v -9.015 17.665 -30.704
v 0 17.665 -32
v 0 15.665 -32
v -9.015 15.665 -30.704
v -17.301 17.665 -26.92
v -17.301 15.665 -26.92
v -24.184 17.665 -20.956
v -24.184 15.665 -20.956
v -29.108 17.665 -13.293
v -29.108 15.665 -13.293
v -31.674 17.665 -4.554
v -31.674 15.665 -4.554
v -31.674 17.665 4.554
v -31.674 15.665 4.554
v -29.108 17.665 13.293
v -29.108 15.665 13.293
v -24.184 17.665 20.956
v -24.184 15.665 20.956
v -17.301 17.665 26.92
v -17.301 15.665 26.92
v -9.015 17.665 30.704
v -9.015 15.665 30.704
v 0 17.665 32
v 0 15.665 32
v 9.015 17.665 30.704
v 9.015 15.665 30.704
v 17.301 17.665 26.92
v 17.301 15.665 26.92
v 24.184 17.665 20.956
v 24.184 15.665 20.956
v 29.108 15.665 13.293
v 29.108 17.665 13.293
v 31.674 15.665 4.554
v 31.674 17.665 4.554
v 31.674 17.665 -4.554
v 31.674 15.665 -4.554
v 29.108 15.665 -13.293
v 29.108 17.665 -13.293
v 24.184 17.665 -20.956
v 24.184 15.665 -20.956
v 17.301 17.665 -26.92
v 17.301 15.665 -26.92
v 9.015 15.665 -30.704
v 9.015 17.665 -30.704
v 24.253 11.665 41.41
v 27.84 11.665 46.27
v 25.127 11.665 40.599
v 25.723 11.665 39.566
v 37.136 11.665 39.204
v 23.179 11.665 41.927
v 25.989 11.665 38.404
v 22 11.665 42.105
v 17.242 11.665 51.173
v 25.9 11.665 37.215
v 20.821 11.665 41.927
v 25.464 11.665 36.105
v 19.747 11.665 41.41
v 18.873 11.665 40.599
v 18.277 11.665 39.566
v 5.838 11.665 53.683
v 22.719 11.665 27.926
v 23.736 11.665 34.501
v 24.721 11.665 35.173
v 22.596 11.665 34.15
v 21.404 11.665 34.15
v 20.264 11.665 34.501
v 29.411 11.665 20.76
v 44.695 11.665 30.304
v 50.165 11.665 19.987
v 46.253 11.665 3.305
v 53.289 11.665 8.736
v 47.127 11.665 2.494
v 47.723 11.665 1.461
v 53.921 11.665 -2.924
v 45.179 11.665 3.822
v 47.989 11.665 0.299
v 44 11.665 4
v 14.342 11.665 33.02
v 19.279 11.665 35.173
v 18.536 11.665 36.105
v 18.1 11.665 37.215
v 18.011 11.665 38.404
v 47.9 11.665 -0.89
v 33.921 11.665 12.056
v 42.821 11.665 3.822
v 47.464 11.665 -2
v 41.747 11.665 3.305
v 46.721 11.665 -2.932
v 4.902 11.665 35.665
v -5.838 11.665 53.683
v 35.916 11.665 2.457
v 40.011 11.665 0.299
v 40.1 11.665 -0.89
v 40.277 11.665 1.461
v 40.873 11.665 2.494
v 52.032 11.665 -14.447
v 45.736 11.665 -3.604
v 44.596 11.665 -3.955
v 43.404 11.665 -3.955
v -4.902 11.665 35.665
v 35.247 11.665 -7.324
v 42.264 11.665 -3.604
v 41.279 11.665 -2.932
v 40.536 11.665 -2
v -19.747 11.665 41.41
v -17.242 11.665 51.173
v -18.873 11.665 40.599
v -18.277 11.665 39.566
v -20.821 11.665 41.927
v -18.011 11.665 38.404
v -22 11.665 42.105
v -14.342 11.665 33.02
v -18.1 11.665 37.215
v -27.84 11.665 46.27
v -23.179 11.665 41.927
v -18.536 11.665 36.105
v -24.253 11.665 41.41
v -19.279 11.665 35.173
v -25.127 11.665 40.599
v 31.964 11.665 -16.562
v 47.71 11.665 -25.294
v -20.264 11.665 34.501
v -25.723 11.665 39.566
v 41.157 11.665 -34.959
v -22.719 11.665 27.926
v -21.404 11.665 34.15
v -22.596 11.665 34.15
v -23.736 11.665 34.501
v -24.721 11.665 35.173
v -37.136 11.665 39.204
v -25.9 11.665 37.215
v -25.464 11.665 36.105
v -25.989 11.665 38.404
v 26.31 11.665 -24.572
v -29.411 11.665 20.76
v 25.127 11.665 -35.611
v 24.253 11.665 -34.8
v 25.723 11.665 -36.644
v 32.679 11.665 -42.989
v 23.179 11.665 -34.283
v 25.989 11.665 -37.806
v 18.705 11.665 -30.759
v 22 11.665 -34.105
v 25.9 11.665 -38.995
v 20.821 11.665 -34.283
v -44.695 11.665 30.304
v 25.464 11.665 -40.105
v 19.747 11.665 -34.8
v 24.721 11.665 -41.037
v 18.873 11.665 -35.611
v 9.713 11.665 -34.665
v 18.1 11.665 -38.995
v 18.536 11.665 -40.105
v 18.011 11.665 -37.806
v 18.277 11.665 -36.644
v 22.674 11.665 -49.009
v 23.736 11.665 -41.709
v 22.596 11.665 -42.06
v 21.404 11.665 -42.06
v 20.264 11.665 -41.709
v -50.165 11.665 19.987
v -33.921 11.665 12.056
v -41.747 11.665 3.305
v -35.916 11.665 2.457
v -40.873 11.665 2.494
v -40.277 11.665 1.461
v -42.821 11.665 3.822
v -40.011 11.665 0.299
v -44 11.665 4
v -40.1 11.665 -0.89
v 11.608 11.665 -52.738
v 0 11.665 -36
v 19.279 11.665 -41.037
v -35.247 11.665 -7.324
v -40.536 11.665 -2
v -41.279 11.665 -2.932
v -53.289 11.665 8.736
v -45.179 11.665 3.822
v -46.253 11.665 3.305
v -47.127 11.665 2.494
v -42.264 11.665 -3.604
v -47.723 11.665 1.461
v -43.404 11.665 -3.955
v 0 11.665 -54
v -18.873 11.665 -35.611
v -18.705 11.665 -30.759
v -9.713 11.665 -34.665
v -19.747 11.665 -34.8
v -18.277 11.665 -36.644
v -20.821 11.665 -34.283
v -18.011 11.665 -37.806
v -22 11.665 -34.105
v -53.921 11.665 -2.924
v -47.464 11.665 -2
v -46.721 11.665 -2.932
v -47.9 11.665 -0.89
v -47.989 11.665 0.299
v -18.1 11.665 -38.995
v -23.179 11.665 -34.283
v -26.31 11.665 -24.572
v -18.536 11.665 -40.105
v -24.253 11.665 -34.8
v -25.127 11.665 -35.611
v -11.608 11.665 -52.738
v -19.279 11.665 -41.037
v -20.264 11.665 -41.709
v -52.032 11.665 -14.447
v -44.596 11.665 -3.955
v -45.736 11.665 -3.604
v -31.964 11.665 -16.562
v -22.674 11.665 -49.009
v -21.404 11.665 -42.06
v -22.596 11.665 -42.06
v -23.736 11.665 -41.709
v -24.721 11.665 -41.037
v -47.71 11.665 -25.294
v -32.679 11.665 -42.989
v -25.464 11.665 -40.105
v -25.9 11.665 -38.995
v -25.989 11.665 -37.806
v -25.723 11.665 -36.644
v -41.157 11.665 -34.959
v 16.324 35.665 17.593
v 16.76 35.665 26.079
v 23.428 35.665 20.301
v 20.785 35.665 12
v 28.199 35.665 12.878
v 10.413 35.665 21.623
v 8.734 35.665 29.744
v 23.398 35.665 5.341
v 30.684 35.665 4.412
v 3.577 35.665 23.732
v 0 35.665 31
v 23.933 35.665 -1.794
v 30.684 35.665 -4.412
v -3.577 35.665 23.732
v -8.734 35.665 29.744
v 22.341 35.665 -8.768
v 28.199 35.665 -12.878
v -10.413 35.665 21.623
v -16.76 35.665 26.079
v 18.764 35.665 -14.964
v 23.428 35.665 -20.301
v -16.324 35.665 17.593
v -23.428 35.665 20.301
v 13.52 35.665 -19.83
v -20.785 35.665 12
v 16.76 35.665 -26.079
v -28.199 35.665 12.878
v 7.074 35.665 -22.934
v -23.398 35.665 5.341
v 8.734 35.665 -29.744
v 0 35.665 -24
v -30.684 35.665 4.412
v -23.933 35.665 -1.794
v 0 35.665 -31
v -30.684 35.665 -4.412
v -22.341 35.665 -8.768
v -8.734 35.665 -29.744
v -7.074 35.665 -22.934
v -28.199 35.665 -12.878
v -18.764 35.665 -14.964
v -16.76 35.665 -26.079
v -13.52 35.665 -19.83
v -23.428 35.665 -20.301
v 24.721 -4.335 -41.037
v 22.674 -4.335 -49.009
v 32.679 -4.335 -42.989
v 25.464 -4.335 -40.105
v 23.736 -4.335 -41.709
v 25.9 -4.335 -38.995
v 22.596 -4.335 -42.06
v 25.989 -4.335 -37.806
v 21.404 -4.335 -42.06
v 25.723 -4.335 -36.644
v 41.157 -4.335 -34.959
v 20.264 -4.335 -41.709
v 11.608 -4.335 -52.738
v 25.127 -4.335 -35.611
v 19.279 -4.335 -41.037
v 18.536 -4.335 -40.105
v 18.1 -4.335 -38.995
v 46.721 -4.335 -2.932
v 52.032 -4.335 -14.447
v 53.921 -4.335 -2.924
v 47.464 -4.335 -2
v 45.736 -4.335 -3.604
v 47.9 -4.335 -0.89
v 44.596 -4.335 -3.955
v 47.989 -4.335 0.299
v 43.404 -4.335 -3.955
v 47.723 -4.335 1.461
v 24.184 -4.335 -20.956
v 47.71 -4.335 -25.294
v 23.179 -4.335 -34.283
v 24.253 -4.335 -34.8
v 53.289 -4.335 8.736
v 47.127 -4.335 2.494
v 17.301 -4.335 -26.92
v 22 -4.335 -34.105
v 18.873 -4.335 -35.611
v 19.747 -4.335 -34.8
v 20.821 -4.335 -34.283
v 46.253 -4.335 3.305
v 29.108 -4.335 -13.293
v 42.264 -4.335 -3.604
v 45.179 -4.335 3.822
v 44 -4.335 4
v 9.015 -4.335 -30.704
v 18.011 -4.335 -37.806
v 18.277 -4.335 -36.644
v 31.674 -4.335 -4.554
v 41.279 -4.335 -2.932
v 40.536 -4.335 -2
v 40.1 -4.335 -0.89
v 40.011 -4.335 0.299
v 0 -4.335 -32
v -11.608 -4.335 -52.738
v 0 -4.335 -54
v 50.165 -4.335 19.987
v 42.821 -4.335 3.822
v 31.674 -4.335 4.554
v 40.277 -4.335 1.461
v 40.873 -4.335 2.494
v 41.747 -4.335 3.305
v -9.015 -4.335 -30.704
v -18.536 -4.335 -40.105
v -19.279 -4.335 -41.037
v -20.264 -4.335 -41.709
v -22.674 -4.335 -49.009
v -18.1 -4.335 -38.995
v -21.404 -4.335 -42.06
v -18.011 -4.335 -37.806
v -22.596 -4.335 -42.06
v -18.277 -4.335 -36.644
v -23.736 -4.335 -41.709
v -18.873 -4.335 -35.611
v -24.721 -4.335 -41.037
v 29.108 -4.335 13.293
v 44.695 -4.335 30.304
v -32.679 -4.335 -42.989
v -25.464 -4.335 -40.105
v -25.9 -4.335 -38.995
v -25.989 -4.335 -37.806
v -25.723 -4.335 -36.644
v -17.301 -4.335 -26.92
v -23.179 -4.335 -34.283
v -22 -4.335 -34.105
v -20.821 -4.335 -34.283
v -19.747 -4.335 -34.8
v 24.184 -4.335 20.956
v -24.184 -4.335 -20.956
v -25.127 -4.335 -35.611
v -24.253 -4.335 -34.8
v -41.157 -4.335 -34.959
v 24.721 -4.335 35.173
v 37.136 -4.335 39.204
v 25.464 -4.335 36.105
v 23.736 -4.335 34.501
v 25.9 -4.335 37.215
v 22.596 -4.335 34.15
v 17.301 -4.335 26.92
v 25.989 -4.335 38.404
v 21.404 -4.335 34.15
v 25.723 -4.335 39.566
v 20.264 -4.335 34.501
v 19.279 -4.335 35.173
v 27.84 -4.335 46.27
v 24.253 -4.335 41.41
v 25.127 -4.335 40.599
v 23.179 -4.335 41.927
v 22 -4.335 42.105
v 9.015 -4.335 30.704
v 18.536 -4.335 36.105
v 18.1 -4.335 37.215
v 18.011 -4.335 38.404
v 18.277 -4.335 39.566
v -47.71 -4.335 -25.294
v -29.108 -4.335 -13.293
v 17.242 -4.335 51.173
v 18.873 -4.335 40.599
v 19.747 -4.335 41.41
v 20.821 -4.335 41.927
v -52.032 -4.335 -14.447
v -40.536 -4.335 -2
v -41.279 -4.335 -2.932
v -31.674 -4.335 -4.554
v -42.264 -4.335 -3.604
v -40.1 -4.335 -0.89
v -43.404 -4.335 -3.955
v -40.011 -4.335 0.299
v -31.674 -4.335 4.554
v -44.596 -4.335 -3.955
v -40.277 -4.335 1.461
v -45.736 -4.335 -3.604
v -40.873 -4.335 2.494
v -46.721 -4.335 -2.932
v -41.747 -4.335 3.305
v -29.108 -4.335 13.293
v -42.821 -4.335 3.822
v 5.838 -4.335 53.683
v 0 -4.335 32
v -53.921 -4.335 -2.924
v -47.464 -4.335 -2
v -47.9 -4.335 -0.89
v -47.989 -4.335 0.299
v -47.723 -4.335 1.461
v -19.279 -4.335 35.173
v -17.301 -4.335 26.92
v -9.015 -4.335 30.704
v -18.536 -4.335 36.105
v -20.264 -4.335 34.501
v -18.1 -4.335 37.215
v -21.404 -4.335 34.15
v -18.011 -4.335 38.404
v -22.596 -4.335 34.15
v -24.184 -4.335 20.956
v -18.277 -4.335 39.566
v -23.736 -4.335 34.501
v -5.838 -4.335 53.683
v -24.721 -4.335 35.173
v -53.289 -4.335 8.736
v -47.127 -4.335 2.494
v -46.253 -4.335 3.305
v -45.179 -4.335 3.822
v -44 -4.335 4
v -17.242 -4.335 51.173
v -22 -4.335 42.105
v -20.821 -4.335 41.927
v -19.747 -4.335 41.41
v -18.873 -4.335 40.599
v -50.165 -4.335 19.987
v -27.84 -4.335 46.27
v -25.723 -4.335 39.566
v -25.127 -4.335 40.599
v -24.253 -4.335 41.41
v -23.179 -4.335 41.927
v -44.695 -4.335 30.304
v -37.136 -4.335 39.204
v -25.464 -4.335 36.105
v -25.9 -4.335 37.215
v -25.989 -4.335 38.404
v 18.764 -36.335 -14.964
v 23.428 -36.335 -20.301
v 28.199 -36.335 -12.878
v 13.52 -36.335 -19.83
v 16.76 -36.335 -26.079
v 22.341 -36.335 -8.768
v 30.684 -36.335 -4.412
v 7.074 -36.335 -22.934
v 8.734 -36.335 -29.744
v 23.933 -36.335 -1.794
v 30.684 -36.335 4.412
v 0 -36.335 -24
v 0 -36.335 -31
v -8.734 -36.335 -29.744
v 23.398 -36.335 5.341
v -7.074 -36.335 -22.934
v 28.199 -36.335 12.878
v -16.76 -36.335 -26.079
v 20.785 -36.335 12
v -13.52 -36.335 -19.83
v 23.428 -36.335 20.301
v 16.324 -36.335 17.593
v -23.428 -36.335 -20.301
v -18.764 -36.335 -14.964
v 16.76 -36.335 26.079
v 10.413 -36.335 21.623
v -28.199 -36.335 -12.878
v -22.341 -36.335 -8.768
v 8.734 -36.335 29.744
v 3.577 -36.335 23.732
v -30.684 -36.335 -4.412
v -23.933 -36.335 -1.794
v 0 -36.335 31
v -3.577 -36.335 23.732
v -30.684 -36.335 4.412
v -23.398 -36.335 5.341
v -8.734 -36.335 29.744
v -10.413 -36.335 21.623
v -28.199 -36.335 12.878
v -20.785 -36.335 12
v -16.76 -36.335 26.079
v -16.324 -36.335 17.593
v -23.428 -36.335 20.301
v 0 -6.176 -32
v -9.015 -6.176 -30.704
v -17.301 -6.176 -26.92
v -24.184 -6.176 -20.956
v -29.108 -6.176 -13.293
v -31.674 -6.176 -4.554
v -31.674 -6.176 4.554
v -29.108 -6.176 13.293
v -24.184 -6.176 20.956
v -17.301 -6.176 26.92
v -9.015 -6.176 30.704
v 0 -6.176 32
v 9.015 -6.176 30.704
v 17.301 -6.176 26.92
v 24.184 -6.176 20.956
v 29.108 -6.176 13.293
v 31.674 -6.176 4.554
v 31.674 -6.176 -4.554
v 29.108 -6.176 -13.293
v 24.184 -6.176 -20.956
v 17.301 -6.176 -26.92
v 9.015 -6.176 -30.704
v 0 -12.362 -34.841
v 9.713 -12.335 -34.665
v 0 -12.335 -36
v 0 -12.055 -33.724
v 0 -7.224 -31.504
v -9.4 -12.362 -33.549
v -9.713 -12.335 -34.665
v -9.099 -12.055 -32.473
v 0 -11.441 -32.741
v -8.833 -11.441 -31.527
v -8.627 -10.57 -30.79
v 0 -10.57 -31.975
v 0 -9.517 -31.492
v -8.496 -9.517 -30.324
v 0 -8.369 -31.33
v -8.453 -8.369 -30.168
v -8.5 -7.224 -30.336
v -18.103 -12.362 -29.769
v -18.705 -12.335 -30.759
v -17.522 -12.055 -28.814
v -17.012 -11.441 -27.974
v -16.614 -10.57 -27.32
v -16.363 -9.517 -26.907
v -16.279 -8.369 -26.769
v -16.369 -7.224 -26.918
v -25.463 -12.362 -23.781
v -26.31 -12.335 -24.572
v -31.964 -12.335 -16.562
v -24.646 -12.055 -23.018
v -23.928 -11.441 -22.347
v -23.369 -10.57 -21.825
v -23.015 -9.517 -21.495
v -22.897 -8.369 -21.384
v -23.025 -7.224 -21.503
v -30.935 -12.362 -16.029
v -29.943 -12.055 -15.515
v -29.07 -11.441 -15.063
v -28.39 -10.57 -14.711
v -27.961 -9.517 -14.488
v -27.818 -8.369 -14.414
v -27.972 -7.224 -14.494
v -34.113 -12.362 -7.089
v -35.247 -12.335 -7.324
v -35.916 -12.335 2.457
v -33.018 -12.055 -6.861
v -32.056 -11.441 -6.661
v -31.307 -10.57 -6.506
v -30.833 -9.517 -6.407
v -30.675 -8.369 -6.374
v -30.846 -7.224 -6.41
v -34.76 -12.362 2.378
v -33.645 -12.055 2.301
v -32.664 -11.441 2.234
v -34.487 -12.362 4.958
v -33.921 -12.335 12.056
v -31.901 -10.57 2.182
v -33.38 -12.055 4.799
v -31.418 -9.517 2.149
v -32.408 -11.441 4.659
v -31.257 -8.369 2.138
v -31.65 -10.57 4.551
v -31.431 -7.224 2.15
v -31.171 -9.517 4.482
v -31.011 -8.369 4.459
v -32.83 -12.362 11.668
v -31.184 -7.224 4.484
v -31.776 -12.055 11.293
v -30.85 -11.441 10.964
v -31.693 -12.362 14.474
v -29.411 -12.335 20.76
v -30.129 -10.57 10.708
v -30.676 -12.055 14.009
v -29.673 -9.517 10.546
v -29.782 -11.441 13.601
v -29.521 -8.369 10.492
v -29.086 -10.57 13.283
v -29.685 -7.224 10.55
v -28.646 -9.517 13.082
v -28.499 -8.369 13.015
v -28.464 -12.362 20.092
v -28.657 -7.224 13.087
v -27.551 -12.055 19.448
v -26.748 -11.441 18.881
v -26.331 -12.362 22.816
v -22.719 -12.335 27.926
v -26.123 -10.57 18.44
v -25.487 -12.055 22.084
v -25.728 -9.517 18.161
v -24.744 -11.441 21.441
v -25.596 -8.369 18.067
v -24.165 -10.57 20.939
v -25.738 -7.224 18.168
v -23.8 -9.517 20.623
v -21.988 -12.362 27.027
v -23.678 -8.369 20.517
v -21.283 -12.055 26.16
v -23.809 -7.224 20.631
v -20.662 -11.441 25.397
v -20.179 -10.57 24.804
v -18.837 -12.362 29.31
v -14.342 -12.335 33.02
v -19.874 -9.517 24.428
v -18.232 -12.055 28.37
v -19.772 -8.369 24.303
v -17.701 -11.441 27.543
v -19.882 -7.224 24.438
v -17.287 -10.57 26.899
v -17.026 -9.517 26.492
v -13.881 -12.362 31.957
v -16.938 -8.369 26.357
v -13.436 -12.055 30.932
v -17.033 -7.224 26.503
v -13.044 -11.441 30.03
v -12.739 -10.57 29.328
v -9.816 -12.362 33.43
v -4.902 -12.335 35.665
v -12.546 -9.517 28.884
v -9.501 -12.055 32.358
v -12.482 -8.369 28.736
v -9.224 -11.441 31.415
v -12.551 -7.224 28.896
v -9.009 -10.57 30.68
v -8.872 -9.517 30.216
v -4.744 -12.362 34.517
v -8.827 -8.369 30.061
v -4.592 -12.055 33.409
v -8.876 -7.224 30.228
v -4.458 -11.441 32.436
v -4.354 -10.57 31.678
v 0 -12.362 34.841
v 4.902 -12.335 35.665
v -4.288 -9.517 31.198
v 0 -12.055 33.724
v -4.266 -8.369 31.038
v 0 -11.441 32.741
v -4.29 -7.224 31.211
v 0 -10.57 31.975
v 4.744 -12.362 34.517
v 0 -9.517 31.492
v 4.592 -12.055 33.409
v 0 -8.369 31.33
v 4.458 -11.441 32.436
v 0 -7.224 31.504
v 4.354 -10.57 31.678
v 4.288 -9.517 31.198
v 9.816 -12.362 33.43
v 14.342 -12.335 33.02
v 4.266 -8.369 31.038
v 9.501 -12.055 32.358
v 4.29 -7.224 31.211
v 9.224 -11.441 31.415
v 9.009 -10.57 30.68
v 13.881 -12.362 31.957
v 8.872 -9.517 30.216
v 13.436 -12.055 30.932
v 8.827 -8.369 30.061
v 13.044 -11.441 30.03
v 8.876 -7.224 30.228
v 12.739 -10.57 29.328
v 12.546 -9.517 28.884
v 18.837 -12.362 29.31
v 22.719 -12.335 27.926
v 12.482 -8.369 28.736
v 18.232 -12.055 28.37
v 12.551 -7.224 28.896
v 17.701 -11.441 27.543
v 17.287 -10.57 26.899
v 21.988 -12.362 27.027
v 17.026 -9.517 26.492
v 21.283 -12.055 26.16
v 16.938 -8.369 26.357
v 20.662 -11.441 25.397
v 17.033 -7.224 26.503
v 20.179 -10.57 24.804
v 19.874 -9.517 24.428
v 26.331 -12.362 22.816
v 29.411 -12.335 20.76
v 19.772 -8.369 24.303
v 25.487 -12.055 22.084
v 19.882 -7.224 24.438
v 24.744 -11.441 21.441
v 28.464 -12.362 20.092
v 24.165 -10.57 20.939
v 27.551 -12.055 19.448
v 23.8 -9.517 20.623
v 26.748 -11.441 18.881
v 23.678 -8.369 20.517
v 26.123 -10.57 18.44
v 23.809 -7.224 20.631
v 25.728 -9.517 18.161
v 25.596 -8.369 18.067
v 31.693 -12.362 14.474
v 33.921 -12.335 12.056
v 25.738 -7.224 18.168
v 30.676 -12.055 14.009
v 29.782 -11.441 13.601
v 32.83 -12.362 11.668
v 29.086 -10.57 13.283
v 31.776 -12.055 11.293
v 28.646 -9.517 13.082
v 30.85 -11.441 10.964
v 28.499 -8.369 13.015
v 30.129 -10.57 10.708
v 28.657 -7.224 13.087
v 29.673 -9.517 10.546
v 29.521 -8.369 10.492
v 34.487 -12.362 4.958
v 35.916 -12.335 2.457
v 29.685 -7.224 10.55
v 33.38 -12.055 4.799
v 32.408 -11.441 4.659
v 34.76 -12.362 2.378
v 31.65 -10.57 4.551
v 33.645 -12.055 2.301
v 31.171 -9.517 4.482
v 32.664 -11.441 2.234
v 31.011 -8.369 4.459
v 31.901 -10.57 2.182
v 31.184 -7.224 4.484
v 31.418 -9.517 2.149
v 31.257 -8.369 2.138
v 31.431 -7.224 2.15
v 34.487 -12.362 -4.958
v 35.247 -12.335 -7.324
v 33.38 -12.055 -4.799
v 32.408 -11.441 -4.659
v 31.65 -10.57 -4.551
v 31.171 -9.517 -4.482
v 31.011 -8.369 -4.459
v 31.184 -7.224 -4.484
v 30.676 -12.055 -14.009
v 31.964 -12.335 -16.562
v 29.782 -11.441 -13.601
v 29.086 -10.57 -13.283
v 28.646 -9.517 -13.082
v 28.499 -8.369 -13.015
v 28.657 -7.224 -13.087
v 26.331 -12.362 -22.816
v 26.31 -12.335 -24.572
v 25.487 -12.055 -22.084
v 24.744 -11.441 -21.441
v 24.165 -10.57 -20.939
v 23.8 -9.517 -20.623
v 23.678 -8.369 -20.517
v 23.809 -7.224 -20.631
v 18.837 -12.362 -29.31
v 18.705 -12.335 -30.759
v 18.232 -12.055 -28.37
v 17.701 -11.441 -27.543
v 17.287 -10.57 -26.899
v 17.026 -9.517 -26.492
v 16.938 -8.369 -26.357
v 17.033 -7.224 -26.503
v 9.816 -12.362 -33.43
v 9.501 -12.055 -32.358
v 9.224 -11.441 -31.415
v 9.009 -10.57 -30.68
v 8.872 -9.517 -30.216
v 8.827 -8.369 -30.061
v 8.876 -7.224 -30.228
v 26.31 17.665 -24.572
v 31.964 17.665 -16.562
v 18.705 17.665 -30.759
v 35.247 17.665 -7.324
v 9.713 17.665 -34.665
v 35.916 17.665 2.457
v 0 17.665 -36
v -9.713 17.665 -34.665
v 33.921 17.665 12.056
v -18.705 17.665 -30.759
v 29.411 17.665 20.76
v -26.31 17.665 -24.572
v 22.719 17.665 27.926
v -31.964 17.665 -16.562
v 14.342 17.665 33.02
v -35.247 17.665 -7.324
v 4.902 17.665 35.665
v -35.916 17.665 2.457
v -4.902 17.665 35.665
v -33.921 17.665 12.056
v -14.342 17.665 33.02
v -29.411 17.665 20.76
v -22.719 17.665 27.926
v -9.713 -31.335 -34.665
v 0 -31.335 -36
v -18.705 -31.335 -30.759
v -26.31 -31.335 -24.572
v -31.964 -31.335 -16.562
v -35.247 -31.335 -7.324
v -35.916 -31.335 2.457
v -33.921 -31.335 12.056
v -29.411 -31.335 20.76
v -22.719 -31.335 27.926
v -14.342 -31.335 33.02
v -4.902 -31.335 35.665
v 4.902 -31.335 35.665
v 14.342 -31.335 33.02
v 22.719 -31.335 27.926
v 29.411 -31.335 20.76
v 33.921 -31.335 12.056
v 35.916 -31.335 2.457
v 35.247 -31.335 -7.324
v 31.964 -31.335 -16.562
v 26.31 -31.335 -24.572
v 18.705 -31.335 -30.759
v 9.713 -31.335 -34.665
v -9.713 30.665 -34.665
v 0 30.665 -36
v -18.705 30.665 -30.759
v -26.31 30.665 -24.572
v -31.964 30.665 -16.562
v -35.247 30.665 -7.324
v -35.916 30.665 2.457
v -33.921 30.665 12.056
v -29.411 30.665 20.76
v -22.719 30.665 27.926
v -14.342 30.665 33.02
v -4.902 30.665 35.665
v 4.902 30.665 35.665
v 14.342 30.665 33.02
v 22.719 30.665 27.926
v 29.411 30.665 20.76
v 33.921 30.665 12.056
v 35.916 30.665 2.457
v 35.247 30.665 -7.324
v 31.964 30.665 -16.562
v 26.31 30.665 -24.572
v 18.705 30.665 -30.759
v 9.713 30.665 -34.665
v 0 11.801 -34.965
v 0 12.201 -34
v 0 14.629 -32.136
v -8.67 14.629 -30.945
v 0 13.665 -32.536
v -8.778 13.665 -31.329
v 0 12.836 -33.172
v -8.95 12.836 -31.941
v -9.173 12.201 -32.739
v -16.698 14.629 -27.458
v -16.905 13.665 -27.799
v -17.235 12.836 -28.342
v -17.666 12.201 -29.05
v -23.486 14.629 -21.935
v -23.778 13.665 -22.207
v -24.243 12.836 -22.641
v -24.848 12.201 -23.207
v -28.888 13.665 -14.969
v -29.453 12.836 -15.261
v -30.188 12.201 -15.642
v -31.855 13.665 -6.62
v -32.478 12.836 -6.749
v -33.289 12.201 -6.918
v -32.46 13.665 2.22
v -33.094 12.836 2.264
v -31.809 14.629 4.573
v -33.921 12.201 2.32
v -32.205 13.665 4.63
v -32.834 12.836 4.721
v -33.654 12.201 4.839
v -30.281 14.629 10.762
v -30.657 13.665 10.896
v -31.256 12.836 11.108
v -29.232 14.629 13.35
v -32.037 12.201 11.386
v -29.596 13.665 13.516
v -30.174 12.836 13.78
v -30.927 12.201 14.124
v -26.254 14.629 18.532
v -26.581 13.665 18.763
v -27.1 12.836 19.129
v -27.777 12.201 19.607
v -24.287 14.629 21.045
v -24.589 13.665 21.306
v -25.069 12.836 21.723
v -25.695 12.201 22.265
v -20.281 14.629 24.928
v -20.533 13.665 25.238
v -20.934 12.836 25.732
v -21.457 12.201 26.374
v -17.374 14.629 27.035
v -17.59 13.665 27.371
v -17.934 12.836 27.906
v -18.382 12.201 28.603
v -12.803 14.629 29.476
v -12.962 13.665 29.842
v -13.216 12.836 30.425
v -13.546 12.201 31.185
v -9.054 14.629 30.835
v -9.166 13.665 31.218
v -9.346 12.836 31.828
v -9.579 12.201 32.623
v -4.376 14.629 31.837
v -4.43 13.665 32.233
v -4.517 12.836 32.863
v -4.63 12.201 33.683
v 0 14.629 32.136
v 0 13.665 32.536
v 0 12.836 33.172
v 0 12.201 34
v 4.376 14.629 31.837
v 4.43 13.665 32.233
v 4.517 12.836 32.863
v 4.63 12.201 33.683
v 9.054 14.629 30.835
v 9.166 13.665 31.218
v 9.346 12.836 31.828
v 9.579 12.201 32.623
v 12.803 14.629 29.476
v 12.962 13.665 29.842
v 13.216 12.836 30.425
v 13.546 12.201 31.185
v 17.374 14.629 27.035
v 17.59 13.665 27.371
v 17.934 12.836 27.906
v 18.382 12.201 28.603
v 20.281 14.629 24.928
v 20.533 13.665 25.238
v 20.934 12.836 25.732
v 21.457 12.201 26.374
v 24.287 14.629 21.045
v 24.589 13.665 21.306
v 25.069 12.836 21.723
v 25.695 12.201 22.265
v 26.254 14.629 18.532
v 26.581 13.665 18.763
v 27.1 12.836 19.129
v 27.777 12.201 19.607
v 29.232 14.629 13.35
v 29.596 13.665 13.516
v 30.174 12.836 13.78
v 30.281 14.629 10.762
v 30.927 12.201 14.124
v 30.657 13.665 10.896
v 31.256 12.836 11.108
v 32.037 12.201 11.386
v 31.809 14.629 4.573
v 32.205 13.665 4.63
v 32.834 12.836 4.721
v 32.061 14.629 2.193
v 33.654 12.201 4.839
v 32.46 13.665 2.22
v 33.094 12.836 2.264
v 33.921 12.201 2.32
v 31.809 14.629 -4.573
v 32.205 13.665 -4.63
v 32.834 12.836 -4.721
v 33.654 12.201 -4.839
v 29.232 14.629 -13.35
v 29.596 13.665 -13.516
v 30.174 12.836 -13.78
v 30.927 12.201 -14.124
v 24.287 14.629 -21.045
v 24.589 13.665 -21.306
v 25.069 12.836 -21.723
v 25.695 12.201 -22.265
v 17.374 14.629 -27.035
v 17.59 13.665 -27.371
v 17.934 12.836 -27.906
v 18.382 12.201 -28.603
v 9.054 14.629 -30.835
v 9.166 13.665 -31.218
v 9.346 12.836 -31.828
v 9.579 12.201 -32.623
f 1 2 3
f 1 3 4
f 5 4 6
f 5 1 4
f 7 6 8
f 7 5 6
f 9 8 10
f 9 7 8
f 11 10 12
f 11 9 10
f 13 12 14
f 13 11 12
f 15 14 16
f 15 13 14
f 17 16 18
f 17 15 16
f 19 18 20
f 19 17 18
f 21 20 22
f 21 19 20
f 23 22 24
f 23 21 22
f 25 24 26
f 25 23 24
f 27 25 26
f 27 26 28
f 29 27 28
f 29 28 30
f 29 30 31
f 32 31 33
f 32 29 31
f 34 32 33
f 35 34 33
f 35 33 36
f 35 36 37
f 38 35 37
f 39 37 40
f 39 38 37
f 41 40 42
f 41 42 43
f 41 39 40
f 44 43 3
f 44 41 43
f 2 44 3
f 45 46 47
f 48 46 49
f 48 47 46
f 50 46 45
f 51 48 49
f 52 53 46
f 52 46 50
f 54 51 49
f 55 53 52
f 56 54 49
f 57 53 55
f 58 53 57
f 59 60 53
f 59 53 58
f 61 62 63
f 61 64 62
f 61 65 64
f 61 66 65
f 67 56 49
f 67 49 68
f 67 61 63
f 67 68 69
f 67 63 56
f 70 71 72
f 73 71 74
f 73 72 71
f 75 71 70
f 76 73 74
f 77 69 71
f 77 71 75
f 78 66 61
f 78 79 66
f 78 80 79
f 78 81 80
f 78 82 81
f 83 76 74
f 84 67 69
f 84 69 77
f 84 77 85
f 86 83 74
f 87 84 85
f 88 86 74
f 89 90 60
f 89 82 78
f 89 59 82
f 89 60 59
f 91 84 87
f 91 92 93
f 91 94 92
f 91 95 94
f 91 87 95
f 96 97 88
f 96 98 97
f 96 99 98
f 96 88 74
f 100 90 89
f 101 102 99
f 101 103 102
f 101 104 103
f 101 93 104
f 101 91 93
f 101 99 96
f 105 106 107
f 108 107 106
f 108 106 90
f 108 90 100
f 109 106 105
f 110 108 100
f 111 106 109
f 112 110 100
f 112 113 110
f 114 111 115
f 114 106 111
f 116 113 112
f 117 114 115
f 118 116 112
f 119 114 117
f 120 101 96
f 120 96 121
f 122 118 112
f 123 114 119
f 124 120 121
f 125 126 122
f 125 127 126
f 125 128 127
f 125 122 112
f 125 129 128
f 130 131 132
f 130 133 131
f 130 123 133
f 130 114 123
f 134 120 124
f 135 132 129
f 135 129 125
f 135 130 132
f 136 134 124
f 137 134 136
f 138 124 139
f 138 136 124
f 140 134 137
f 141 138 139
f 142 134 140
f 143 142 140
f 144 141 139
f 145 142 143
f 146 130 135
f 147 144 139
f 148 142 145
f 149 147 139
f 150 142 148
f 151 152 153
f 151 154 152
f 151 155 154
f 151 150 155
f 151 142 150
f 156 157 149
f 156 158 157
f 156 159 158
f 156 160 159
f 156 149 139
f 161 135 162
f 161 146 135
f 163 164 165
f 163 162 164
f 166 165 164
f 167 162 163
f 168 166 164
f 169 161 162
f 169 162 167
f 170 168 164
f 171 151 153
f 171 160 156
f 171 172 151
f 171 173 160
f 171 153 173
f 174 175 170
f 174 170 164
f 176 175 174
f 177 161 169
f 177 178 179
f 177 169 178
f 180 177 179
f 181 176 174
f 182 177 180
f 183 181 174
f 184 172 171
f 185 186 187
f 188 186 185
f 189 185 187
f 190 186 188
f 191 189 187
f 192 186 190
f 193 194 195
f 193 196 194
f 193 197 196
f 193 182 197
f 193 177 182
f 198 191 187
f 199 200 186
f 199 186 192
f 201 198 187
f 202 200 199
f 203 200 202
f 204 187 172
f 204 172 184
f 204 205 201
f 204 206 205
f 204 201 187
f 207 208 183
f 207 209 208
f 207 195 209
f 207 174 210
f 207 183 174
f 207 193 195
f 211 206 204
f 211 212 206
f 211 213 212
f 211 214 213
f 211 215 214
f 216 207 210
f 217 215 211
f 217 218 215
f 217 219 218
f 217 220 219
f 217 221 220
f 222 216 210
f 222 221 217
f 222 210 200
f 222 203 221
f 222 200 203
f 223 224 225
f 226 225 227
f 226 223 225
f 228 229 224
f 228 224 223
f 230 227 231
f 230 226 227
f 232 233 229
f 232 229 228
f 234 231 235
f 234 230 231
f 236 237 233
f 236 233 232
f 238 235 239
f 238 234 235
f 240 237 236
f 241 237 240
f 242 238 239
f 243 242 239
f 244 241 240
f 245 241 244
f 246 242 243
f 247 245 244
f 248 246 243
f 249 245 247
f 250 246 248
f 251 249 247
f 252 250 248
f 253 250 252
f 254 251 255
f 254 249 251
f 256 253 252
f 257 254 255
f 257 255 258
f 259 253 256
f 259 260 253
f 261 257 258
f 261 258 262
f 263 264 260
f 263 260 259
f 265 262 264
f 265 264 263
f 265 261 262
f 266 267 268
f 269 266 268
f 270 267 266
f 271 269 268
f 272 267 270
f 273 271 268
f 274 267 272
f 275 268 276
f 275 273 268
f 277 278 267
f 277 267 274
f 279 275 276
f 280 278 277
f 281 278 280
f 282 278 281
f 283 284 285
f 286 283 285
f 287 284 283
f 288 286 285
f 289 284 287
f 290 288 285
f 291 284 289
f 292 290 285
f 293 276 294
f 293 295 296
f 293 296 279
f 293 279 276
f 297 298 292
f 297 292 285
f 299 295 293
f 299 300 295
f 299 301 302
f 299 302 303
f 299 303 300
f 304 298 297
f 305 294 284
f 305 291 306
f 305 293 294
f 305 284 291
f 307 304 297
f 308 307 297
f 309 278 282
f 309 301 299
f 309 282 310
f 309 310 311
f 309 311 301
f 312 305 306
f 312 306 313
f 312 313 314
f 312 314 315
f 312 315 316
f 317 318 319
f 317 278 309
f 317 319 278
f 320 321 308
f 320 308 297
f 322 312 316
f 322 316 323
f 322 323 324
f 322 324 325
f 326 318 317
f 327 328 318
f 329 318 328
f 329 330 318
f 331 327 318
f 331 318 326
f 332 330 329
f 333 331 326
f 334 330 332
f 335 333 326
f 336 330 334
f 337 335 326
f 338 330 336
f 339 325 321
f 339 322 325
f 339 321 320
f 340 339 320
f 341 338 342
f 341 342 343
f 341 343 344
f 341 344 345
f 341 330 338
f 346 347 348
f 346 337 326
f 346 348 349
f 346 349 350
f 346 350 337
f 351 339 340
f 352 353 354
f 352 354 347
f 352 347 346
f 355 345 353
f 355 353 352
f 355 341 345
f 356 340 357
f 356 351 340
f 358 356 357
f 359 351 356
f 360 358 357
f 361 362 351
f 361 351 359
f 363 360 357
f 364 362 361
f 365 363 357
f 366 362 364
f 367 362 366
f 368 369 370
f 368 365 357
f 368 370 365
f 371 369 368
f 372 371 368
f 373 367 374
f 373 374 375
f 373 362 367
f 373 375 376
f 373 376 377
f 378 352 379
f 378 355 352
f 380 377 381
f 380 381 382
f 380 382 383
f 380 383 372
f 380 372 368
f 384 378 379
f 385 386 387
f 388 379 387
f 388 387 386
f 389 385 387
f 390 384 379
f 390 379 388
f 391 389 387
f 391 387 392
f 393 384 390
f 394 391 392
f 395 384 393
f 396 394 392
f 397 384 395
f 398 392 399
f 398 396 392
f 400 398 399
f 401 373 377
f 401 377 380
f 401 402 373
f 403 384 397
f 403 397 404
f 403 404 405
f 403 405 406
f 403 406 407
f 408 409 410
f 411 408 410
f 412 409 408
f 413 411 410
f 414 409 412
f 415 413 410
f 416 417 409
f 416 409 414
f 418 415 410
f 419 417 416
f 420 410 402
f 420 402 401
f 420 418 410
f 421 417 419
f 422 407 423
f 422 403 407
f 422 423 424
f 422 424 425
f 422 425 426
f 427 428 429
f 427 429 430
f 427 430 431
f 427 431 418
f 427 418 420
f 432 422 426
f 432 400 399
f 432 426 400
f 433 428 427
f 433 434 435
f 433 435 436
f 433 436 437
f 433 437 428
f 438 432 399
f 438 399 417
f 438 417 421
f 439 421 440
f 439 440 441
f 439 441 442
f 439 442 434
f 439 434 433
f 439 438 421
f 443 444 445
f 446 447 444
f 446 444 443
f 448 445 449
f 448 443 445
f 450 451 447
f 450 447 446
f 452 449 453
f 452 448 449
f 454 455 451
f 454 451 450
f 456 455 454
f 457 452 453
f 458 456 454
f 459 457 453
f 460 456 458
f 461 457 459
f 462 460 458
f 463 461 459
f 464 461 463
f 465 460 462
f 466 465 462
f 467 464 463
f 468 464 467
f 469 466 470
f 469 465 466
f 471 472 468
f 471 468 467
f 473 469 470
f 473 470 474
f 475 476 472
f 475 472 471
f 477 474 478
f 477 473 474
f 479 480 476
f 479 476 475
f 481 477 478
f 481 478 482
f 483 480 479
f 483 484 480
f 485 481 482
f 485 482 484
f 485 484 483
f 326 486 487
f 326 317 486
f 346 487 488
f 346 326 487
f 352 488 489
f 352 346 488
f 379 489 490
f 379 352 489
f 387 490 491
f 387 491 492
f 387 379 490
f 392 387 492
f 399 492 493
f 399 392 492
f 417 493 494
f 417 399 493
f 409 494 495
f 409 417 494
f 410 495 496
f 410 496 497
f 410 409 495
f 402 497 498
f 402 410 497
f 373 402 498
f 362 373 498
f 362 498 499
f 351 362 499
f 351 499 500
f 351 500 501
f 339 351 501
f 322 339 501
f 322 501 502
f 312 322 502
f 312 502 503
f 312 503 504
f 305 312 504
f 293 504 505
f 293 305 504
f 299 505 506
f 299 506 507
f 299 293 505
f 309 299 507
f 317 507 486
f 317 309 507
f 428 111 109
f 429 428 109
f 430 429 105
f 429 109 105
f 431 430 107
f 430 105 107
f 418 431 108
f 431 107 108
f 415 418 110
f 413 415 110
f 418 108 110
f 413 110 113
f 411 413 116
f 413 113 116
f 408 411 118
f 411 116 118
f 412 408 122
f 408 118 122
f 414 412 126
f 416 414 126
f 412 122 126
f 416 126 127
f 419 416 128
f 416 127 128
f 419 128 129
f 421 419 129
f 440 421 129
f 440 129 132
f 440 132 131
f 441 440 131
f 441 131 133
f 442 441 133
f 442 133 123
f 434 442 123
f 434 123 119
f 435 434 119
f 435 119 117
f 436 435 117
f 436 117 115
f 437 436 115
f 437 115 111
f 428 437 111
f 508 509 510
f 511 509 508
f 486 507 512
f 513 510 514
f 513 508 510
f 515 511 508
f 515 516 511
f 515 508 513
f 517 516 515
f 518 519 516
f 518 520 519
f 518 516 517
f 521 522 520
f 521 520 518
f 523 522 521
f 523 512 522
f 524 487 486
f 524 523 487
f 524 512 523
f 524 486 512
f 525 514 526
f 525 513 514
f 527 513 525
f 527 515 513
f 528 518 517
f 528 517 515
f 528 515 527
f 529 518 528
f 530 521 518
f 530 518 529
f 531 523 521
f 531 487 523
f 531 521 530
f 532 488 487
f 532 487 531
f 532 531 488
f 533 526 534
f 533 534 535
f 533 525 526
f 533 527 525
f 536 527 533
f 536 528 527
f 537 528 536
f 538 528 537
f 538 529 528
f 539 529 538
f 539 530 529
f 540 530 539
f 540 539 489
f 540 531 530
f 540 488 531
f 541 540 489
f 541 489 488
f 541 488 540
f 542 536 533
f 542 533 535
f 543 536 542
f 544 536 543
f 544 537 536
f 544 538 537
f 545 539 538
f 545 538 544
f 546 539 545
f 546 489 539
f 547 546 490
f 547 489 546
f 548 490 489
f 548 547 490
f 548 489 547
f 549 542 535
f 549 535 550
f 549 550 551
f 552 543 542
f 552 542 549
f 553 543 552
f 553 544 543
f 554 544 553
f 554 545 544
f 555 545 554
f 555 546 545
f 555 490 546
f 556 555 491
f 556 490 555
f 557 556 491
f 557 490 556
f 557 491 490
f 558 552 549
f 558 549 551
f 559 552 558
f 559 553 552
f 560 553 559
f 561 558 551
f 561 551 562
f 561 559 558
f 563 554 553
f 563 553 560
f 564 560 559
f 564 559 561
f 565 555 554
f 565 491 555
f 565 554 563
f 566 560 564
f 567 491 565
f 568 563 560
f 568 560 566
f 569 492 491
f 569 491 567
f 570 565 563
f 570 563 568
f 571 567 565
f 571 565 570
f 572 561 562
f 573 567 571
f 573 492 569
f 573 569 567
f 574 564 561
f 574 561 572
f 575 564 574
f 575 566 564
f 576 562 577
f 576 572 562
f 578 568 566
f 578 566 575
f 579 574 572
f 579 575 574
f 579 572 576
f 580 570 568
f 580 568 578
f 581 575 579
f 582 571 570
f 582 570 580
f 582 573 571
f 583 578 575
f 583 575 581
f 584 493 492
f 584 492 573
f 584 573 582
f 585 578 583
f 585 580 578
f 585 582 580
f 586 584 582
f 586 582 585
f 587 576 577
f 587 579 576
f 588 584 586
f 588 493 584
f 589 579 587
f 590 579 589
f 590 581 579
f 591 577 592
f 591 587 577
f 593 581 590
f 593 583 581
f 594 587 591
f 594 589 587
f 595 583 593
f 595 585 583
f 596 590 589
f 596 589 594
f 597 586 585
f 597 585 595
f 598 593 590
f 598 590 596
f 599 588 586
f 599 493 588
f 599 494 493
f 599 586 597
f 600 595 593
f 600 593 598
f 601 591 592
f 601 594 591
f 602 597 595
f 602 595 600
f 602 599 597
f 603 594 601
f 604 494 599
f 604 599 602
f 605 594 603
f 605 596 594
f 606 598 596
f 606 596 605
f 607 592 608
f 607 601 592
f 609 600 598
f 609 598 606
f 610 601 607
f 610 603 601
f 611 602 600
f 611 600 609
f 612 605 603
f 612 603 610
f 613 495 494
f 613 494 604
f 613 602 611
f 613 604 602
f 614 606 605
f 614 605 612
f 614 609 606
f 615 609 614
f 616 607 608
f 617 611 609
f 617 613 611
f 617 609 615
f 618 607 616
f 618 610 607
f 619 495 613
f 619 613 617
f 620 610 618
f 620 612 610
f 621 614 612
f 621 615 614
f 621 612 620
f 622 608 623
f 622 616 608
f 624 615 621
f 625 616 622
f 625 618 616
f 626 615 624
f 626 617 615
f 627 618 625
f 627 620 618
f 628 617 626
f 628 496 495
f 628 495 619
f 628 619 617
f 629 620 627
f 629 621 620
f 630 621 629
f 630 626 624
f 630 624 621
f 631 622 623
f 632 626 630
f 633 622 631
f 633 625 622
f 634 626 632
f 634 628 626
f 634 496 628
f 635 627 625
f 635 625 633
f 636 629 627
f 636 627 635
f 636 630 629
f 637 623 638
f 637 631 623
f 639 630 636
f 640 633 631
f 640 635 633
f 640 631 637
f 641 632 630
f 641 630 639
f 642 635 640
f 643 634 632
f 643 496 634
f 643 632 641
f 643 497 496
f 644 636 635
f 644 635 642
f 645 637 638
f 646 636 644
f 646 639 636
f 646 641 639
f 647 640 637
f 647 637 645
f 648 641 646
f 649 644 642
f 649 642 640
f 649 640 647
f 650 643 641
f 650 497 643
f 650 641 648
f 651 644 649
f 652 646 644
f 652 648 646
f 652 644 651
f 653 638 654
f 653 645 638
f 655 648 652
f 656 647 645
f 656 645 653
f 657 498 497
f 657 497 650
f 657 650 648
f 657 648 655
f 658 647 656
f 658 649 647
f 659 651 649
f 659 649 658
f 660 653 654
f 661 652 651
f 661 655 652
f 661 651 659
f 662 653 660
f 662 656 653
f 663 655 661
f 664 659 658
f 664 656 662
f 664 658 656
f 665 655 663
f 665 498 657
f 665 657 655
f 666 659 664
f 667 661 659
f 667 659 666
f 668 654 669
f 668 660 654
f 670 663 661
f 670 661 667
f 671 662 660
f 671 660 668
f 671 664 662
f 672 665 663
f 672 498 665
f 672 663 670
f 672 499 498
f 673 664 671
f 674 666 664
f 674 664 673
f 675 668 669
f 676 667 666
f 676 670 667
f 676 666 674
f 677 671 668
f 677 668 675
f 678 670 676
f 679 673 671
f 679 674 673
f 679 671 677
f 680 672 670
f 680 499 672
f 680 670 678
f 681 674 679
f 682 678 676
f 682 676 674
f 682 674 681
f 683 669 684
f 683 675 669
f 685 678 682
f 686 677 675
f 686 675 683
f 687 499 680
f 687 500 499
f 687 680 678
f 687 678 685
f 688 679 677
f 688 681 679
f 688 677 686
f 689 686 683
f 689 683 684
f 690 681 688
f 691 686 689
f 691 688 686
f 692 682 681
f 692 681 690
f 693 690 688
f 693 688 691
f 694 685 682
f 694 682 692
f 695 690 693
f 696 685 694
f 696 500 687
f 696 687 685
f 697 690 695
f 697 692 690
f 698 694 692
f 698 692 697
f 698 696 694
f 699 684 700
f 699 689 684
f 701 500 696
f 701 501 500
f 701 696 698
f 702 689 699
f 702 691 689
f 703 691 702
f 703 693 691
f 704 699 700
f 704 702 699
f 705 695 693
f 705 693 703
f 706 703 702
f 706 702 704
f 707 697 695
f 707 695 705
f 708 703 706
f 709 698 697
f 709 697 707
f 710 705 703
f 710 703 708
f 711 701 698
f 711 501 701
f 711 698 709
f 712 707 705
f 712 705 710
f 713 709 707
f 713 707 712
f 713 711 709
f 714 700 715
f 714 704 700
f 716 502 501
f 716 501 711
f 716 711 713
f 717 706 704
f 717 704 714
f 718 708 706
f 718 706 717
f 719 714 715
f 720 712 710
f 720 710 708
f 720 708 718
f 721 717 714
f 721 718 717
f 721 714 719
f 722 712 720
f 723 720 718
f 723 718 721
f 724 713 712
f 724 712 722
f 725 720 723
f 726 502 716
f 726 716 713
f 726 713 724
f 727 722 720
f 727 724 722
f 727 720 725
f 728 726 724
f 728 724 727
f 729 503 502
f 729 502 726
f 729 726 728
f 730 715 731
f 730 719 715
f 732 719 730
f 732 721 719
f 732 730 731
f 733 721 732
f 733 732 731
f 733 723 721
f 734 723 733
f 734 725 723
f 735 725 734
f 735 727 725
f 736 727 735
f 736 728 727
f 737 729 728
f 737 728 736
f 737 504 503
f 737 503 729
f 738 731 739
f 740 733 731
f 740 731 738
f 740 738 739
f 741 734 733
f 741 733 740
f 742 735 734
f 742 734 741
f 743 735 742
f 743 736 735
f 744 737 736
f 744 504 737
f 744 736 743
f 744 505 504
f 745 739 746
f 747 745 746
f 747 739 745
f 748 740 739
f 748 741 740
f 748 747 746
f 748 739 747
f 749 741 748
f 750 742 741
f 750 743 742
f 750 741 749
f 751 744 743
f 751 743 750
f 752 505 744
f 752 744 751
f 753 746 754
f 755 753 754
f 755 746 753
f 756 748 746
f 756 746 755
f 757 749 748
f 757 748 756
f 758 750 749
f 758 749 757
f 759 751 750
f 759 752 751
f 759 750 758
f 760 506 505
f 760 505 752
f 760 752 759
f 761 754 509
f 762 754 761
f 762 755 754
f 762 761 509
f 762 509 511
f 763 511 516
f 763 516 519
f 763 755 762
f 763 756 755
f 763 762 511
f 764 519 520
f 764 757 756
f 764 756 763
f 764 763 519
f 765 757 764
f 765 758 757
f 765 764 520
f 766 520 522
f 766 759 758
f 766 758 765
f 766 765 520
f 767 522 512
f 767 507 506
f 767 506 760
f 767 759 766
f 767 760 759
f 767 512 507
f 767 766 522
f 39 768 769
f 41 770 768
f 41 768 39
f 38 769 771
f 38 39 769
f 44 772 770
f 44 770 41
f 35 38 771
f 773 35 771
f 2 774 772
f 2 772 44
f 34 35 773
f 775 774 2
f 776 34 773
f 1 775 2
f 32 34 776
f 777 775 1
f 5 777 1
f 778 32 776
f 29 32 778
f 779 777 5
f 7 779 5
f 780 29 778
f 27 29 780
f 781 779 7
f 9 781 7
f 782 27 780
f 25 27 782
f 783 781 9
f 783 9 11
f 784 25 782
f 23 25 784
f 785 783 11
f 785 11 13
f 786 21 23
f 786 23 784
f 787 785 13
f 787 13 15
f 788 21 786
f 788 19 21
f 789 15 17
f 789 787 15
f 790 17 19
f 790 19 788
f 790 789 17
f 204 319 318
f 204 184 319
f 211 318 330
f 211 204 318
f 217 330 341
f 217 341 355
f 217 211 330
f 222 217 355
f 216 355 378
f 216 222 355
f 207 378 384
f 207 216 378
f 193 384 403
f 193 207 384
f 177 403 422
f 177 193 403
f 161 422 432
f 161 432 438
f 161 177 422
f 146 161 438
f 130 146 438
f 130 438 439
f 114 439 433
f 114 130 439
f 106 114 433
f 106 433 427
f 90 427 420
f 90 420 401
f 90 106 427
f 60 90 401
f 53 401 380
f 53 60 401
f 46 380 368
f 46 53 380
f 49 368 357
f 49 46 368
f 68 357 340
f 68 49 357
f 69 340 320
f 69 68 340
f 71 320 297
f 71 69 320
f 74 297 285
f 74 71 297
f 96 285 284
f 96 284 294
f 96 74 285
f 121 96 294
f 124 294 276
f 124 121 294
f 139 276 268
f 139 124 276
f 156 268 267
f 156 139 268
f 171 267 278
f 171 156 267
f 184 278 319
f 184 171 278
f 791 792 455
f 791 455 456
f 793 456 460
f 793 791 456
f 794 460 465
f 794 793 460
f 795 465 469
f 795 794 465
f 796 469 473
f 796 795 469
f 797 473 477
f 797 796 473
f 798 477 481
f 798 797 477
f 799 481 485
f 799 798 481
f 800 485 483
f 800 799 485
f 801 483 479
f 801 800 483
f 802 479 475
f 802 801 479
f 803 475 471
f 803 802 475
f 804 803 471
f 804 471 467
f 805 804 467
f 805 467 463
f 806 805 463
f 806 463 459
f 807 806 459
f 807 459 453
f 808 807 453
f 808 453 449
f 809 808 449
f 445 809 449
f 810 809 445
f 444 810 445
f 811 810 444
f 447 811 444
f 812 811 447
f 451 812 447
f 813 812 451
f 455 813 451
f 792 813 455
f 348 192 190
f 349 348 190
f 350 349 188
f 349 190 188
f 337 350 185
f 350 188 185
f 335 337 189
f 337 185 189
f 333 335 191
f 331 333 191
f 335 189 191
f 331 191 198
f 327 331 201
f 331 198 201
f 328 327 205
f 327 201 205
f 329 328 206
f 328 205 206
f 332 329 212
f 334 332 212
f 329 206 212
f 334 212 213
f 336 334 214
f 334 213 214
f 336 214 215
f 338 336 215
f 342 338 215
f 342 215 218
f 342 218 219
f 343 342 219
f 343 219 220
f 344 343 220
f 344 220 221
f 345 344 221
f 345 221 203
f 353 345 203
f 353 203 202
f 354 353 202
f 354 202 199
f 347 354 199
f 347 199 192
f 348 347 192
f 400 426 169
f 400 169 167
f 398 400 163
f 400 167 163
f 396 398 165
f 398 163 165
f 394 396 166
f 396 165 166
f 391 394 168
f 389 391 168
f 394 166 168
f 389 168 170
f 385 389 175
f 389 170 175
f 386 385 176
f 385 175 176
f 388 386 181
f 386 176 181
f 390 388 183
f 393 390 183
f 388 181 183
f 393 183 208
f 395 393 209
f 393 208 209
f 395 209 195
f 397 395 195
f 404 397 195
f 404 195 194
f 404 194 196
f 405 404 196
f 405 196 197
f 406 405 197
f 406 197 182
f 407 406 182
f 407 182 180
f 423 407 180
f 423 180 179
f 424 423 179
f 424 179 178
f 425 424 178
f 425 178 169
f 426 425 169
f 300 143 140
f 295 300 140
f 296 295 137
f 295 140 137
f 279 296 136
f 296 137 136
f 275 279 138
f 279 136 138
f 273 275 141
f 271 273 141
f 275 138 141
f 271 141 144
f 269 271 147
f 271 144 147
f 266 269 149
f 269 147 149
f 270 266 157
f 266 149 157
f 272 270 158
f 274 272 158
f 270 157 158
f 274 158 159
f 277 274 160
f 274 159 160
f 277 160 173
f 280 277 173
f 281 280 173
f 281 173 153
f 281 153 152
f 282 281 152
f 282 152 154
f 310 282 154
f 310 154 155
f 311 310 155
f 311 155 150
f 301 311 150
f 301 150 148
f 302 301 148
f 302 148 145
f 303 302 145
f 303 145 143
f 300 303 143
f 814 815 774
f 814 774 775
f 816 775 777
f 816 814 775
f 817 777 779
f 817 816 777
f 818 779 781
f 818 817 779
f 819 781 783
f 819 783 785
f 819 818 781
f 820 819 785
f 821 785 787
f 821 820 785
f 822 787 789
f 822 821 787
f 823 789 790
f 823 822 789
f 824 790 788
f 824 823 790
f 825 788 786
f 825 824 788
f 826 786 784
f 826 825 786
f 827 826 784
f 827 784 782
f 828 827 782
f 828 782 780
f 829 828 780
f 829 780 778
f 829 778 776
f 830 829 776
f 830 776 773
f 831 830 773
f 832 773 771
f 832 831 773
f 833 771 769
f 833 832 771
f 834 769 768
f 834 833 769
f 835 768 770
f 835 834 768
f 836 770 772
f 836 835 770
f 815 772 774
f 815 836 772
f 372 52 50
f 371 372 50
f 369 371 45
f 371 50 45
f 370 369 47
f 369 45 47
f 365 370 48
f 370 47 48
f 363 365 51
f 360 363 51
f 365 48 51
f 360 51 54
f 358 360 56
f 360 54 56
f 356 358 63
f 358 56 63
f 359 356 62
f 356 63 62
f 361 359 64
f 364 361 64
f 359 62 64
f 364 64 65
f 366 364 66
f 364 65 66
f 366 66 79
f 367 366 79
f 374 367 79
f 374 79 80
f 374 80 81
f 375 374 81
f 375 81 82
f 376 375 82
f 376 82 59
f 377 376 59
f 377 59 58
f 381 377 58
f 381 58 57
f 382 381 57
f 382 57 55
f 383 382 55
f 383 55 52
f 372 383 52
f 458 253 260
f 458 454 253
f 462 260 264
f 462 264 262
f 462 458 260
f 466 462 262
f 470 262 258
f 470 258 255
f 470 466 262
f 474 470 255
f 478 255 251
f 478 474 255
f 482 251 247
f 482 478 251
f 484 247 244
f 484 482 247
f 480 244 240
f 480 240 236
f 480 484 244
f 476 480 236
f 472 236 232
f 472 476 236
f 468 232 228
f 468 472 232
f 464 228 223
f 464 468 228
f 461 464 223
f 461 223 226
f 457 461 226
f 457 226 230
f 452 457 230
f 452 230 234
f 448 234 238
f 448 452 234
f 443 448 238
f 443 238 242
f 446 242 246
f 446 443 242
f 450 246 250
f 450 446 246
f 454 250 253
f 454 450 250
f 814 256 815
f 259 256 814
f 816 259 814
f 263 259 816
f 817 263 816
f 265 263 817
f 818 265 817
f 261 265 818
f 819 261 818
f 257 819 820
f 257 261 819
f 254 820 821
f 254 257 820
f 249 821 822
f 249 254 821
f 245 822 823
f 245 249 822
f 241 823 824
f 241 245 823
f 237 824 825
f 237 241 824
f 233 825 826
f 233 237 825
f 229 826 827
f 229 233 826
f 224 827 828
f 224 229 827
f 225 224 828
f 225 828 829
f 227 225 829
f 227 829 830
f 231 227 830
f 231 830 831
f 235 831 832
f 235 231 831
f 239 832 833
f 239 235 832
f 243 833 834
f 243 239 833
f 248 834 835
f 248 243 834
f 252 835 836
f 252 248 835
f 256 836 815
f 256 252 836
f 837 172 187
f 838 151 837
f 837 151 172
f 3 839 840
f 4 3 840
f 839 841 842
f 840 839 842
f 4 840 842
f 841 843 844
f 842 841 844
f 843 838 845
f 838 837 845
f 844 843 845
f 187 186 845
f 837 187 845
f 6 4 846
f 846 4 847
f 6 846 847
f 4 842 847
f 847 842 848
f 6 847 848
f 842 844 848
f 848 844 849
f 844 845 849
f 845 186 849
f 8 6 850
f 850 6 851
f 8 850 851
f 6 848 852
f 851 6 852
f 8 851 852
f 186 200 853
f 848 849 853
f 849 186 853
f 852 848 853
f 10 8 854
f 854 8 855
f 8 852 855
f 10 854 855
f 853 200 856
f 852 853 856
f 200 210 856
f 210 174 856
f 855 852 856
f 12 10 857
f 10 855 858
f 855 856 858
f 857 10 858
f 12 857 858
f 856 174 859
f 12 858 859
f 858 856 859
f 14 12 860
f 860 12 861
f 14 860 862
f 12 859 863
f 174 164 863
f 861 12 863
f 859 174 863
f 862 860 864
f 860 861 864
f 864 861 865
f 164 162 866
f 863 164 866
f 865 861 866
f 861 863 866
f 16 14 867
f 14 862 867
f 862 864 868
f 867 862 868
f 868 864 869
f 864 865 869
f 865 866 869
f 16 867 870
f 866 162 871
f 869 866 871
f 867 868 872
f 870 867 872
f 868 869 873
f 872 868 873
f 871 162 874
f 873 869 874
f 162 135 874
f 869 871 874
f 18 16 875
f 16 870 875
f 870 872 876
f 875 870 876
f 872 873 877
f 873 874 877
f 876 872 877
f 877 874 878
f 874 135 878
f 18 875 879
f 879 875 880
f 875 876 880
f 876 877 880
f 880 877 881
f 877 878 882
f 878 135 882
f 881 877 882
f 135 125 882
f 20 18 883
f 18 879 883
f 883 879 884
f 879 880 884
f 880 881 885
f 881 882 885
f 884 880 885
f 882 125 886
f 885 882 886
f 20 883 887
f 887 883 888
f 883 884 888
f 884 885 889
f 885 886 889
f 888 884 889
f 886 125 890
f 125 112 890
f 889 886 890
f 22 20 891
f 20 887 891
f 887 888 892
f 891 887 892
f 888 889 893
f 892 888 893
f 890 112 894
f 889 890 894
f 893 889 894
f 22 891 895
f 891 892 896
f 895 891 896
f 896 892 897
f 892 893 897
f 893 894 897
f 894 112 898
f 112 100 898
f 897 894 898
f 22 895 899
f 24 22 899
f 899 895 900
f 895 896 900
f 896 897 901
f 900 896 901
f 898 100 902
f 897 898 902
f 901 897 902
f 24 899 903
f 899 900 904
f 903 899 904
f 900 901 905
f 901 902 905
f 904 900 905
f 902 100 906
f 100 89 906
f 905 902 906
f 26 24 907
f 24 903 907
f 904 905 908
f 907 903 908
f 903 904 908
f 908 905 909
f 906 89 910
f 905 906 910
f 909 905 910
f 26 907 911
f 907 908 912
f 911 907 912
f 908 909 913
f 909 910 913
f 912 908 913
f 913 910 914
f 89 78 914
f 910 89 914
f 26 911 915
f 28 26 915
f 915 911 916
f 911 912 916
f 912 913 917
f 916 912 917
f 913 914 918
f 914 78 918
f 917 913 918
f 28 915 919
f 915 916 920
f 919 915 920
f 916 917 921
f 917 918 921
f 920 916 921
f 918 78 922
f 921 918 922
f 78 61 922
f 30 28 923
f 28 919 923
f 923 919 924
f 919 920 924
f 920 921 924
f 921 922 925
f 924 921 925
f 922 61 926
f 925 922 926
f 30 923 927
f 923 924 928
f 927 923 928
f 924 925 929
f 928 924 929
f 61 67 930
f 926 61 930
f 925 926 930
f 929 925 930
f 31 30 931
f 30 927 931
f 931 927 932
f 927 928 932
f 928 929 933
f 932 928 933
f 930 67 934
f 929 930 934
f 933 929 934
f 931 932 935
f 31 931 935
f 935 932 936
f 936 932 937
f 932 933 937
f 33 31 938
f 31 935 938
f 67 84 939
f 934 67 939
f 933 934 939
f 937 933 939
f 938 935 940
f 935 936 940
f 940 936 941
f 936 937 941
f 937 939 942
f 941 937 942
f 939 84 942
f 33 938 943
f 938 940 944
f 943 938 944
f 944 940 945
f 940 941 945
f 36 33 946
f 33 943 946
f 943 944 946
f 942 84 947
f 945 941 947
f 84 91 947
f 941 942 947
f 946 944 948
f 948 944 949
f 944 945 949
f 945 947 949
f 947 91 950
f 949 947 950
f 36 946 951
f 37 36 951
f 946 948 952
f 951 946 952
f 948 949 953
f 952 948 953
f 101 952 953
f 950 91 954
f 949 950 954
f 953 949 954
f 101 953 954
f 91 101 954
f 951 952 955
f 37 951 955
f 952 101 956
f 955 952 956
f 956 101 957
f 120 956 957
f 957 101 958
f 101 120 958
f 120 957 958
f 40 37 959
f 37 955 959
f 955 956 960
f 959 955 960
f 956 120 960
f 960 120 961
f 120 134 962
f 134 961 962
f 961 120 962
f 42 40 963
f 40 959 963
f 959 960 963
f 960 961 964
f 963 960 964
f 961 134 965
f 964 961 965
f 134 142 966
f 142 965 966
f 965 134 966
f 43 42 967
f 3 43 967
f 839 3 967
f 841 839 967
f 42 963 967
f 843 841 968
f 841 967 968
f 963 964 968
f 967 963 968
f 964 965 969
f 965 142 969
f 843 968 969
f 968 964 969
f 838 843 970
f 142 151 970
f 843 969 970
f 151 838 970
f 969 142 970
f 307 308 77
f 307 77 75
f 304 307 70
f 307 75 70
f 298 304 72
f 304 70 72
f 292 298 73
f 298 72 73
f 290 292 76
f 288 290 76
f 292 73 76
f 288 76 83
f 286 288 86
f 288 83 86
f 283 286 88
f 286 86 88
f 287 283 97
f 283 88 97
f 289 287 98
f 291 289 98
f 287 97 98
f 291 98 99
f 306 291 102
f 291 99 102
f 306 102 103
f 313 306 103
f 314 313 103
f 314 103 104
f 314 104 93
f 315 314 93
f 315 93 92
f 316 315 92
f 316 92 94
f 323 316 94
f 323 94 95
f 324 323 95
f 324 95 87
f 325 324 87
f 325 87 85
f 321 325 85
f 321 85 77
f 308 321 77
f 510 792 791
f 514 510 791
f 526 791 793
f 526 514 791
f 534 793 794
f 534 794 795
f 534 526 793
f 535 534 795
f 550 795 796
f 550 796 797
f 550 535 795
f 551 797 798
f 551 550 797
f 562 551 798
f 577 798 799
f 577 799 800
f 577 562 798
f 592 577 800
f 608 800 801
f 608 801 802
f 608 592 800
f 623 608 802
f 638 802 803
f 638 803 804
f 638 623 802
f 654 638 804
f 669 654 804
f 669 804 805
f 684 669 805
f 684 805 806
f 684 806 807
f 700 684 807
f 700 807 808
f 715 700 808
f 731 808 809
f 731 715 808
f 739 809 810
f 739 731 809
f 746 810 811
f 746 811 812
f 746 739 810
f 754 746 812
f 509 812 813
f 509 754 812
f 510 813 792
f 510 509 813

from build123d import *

# Parameters (mm, degrees)
CHAMFER2_SIZE      = 5
FILLET1_R          = 4
CUT_EXTRUDE1_REACH = 92.2
SKETCH2_R          = 4


with BuildPart() as part:
    # Sketch1 → Revolve1 (revolve)
    with BuildSketch(Plane.XY, mode=Mode.PRIVATE) as revolve1_sk:
        with BuildLine():
            ThreePointArc((-36, -12.335343788), (-31.975370241, -10.570389375), (-32, -6.175835683))
            Line((-32, -6.175835683), (-32, -4.335343788))
            Line((-32, -4.335343788), (-54, -4.335343788))
            Line((-54, -4.335343788), (-54, 11.664656212))
            Line((-54, 11.664656212), (-32, 11.664656212))
            Line((-32, 11.664656212), (-32, 17.664656212))
            Line((-32, 17.664656212), (-36, 17.664656212))
            Line((-36, 17.664656212), (-36, 35.664656212))
            Line((-36, 35.664656212), (-24, 35.664656212))
            Line((-24, 35.664656212), (-24, -36.335343788))
            Line((-24, -36.335343788), (-36, -36.335343788))
            Line((-36, -36.335343788), (-36, -12.335343788))
        make_face()
    revolve(revolve1_sk.sketch.rotate(Axis((0, 0, 0), (0, 1, 0)), 270), axis=Axis((0, 0, 0), (0, 1, 0)))

    # Chamfer2
    chamfer2_edges = [part.edges().sort_by_distance(p)[0] for p in [
        (0, 35.664656212, 36),
        (0, -36.335343788, 36),
    ]]
    chamfer(chamfer2_edges, length=CHAMFER2_SIZE)

    # Fillet1
    fillet1_edges = [part.edges().sort_by_distance(p)[0] for p in [
        (0, 11.664656212, 32),
    ]]
    fillet(fillet1_edges, radius=FILLET1_R)

    # Sketch2 → Cut-Extrude1 (cut, up to next)
    with BuildSketch(Plane(origin=(0, 11.664656212, 0), x_dir=(1, 0, 0), z_dir=(0, 1, 0)), mode=Mode.PRIVATE) as cut_extrude1_sk1:
        with Locations(Location((44, 0, 0), (0, 0, 270))):
            Circle(SKETCH2_R)
    cut_extrude1_tool1 = extrude(cut_extrude1_sk1.sketch, amount=-CUT_EXTRUDE1_REACH, mode=Mode.PRIVATE) & part.part
    # Sketch2 → Cut-Extrude1 (cut, up to next)
    with BuildSketch(Plane(origin=(0, 11.664656212, 0), x_dir=(1, 0, 0), z_dir=(0, 1, 0)), mode=Mode.PRIVATE) as cut_extrude1_sk2:
        with Locations(Location((22, -38.105117767, 0), (0, 0, 270))):
            Circle(SKETCH2_R)
    cut_extrude1_tool2 = extrude(cut_extrude1_sk2.sketch, amount=-CUT_EXTRUDE1_REACH, mode=Mode.PRIVATE) & part.part
    # Sketch2 → Cut-Extrude1 (cut, up to next)
    with BuildSketch(Plane(origin=(0, 11.664656212, 0), x_dir=(1, 0, 0), z_dir=(0, 1, 0)), mode=Mode.PRIVATE) as cut_extrude1_sk3:
        with Locations(Location((-22, -38.105117767, 0), (0, 0, 270))):
            Circle(SKETCH2_R)
    cut_extrude1_tool3 = extrude(cut_extrude1_sk3.sketch, amount=-CUT_EXTRUDE1_REACH, mode=Mode.PRIVATE) & part.part
    # Sketch2 → Cut-Extrude1 (cut, up to next)
    with BuildSketch(Plane(origin=(0, 11.664656212, 0), x_dir=(1, 0, 0), z_dir=(0, 1, 0)), mode=Mode.PRIVATE) as cut_extrude1_sk4:
        with Locations(Location((-44, 0, 0), (0, 0, 270))):
            Circle(SKETCH2_R)
    cut_extrude1_tool4 = extrude(cut_extrude1_sk4.sketch, amount=-CUT_EXTRUDE1_REACH, mode=Mode.PRIVATE) & part.part
    # Sketch2 → Cut-Extrude1 (cut, up to next)
    with BuildSketch(Plane(origin=(0, 11.664656212, 0), x_dir=(1, 0, 0), z_dir=(0, 1, 0)), mode=Mode.PRIVATE) as cut_extrude1_sk5:
        with Locations(Location((-22, 38.105117767, 0), (0, 0, 270))):
            Circle(SKETCH2_R)
    cut_extrude1_tool5 = extrude(cut_extrude1_sk5.sketch, amount=-CUT_EXTRUDE1_REACH, mode=Mode.PRIVATE) & part.part
    # Sketch2 → Cut-Extrude1 (cut, up to next)
    with BuildSketch(Plane(origin=(0, 11.664656212, 0), x_dir=(1, 0, 0), z_dir=(0, 1, 0)), mode=Mode.PRIVATE) as cut_extrude1_sk6:
        with Locations(Location((22, 38.105117767, 0), (0, 0, 270))):
            Circle(SKETCH2_R)
    cut_extrude1_tool6 = extrude(cut_extrude1_sk6.sketch, amount=-CUT_EXTRUDE1_REACH, mode=Mode.PRIVATE) & part.part
    add(cut_extrude1_tool1.solids().sort_by_distance((44, 11.664656, 0))[0], mode=Mode.SUBTRACT)
    add(cut_extrude1_tool2.solids().sort_by_distance((22, 11.664656, 38.105118))[0], mode=Mode.SUBTRACT)
    add(cut_extrude1_tool3.solids().sort_by_distance((-22, 11.664656, 38.105118))[0], mode=Mode.SUBTRACT)
    add(cut_extrude1_tool4.solids().sort_by_distance((-44, 11.664656, 0))[0], mode=Mode.SUBTRACT)
    add(cut_extrude1_tool5.solids().sort_by_distance((-22, 11.664656, -38.105118))[0], mode=Mode.SUBTRACT)
    add(cut_extrude1_tool6.solids().sort_by_distance((22, 11.664656, -38.105118))[0], mode=Mode.SUBTRACT)


solid = part.part
